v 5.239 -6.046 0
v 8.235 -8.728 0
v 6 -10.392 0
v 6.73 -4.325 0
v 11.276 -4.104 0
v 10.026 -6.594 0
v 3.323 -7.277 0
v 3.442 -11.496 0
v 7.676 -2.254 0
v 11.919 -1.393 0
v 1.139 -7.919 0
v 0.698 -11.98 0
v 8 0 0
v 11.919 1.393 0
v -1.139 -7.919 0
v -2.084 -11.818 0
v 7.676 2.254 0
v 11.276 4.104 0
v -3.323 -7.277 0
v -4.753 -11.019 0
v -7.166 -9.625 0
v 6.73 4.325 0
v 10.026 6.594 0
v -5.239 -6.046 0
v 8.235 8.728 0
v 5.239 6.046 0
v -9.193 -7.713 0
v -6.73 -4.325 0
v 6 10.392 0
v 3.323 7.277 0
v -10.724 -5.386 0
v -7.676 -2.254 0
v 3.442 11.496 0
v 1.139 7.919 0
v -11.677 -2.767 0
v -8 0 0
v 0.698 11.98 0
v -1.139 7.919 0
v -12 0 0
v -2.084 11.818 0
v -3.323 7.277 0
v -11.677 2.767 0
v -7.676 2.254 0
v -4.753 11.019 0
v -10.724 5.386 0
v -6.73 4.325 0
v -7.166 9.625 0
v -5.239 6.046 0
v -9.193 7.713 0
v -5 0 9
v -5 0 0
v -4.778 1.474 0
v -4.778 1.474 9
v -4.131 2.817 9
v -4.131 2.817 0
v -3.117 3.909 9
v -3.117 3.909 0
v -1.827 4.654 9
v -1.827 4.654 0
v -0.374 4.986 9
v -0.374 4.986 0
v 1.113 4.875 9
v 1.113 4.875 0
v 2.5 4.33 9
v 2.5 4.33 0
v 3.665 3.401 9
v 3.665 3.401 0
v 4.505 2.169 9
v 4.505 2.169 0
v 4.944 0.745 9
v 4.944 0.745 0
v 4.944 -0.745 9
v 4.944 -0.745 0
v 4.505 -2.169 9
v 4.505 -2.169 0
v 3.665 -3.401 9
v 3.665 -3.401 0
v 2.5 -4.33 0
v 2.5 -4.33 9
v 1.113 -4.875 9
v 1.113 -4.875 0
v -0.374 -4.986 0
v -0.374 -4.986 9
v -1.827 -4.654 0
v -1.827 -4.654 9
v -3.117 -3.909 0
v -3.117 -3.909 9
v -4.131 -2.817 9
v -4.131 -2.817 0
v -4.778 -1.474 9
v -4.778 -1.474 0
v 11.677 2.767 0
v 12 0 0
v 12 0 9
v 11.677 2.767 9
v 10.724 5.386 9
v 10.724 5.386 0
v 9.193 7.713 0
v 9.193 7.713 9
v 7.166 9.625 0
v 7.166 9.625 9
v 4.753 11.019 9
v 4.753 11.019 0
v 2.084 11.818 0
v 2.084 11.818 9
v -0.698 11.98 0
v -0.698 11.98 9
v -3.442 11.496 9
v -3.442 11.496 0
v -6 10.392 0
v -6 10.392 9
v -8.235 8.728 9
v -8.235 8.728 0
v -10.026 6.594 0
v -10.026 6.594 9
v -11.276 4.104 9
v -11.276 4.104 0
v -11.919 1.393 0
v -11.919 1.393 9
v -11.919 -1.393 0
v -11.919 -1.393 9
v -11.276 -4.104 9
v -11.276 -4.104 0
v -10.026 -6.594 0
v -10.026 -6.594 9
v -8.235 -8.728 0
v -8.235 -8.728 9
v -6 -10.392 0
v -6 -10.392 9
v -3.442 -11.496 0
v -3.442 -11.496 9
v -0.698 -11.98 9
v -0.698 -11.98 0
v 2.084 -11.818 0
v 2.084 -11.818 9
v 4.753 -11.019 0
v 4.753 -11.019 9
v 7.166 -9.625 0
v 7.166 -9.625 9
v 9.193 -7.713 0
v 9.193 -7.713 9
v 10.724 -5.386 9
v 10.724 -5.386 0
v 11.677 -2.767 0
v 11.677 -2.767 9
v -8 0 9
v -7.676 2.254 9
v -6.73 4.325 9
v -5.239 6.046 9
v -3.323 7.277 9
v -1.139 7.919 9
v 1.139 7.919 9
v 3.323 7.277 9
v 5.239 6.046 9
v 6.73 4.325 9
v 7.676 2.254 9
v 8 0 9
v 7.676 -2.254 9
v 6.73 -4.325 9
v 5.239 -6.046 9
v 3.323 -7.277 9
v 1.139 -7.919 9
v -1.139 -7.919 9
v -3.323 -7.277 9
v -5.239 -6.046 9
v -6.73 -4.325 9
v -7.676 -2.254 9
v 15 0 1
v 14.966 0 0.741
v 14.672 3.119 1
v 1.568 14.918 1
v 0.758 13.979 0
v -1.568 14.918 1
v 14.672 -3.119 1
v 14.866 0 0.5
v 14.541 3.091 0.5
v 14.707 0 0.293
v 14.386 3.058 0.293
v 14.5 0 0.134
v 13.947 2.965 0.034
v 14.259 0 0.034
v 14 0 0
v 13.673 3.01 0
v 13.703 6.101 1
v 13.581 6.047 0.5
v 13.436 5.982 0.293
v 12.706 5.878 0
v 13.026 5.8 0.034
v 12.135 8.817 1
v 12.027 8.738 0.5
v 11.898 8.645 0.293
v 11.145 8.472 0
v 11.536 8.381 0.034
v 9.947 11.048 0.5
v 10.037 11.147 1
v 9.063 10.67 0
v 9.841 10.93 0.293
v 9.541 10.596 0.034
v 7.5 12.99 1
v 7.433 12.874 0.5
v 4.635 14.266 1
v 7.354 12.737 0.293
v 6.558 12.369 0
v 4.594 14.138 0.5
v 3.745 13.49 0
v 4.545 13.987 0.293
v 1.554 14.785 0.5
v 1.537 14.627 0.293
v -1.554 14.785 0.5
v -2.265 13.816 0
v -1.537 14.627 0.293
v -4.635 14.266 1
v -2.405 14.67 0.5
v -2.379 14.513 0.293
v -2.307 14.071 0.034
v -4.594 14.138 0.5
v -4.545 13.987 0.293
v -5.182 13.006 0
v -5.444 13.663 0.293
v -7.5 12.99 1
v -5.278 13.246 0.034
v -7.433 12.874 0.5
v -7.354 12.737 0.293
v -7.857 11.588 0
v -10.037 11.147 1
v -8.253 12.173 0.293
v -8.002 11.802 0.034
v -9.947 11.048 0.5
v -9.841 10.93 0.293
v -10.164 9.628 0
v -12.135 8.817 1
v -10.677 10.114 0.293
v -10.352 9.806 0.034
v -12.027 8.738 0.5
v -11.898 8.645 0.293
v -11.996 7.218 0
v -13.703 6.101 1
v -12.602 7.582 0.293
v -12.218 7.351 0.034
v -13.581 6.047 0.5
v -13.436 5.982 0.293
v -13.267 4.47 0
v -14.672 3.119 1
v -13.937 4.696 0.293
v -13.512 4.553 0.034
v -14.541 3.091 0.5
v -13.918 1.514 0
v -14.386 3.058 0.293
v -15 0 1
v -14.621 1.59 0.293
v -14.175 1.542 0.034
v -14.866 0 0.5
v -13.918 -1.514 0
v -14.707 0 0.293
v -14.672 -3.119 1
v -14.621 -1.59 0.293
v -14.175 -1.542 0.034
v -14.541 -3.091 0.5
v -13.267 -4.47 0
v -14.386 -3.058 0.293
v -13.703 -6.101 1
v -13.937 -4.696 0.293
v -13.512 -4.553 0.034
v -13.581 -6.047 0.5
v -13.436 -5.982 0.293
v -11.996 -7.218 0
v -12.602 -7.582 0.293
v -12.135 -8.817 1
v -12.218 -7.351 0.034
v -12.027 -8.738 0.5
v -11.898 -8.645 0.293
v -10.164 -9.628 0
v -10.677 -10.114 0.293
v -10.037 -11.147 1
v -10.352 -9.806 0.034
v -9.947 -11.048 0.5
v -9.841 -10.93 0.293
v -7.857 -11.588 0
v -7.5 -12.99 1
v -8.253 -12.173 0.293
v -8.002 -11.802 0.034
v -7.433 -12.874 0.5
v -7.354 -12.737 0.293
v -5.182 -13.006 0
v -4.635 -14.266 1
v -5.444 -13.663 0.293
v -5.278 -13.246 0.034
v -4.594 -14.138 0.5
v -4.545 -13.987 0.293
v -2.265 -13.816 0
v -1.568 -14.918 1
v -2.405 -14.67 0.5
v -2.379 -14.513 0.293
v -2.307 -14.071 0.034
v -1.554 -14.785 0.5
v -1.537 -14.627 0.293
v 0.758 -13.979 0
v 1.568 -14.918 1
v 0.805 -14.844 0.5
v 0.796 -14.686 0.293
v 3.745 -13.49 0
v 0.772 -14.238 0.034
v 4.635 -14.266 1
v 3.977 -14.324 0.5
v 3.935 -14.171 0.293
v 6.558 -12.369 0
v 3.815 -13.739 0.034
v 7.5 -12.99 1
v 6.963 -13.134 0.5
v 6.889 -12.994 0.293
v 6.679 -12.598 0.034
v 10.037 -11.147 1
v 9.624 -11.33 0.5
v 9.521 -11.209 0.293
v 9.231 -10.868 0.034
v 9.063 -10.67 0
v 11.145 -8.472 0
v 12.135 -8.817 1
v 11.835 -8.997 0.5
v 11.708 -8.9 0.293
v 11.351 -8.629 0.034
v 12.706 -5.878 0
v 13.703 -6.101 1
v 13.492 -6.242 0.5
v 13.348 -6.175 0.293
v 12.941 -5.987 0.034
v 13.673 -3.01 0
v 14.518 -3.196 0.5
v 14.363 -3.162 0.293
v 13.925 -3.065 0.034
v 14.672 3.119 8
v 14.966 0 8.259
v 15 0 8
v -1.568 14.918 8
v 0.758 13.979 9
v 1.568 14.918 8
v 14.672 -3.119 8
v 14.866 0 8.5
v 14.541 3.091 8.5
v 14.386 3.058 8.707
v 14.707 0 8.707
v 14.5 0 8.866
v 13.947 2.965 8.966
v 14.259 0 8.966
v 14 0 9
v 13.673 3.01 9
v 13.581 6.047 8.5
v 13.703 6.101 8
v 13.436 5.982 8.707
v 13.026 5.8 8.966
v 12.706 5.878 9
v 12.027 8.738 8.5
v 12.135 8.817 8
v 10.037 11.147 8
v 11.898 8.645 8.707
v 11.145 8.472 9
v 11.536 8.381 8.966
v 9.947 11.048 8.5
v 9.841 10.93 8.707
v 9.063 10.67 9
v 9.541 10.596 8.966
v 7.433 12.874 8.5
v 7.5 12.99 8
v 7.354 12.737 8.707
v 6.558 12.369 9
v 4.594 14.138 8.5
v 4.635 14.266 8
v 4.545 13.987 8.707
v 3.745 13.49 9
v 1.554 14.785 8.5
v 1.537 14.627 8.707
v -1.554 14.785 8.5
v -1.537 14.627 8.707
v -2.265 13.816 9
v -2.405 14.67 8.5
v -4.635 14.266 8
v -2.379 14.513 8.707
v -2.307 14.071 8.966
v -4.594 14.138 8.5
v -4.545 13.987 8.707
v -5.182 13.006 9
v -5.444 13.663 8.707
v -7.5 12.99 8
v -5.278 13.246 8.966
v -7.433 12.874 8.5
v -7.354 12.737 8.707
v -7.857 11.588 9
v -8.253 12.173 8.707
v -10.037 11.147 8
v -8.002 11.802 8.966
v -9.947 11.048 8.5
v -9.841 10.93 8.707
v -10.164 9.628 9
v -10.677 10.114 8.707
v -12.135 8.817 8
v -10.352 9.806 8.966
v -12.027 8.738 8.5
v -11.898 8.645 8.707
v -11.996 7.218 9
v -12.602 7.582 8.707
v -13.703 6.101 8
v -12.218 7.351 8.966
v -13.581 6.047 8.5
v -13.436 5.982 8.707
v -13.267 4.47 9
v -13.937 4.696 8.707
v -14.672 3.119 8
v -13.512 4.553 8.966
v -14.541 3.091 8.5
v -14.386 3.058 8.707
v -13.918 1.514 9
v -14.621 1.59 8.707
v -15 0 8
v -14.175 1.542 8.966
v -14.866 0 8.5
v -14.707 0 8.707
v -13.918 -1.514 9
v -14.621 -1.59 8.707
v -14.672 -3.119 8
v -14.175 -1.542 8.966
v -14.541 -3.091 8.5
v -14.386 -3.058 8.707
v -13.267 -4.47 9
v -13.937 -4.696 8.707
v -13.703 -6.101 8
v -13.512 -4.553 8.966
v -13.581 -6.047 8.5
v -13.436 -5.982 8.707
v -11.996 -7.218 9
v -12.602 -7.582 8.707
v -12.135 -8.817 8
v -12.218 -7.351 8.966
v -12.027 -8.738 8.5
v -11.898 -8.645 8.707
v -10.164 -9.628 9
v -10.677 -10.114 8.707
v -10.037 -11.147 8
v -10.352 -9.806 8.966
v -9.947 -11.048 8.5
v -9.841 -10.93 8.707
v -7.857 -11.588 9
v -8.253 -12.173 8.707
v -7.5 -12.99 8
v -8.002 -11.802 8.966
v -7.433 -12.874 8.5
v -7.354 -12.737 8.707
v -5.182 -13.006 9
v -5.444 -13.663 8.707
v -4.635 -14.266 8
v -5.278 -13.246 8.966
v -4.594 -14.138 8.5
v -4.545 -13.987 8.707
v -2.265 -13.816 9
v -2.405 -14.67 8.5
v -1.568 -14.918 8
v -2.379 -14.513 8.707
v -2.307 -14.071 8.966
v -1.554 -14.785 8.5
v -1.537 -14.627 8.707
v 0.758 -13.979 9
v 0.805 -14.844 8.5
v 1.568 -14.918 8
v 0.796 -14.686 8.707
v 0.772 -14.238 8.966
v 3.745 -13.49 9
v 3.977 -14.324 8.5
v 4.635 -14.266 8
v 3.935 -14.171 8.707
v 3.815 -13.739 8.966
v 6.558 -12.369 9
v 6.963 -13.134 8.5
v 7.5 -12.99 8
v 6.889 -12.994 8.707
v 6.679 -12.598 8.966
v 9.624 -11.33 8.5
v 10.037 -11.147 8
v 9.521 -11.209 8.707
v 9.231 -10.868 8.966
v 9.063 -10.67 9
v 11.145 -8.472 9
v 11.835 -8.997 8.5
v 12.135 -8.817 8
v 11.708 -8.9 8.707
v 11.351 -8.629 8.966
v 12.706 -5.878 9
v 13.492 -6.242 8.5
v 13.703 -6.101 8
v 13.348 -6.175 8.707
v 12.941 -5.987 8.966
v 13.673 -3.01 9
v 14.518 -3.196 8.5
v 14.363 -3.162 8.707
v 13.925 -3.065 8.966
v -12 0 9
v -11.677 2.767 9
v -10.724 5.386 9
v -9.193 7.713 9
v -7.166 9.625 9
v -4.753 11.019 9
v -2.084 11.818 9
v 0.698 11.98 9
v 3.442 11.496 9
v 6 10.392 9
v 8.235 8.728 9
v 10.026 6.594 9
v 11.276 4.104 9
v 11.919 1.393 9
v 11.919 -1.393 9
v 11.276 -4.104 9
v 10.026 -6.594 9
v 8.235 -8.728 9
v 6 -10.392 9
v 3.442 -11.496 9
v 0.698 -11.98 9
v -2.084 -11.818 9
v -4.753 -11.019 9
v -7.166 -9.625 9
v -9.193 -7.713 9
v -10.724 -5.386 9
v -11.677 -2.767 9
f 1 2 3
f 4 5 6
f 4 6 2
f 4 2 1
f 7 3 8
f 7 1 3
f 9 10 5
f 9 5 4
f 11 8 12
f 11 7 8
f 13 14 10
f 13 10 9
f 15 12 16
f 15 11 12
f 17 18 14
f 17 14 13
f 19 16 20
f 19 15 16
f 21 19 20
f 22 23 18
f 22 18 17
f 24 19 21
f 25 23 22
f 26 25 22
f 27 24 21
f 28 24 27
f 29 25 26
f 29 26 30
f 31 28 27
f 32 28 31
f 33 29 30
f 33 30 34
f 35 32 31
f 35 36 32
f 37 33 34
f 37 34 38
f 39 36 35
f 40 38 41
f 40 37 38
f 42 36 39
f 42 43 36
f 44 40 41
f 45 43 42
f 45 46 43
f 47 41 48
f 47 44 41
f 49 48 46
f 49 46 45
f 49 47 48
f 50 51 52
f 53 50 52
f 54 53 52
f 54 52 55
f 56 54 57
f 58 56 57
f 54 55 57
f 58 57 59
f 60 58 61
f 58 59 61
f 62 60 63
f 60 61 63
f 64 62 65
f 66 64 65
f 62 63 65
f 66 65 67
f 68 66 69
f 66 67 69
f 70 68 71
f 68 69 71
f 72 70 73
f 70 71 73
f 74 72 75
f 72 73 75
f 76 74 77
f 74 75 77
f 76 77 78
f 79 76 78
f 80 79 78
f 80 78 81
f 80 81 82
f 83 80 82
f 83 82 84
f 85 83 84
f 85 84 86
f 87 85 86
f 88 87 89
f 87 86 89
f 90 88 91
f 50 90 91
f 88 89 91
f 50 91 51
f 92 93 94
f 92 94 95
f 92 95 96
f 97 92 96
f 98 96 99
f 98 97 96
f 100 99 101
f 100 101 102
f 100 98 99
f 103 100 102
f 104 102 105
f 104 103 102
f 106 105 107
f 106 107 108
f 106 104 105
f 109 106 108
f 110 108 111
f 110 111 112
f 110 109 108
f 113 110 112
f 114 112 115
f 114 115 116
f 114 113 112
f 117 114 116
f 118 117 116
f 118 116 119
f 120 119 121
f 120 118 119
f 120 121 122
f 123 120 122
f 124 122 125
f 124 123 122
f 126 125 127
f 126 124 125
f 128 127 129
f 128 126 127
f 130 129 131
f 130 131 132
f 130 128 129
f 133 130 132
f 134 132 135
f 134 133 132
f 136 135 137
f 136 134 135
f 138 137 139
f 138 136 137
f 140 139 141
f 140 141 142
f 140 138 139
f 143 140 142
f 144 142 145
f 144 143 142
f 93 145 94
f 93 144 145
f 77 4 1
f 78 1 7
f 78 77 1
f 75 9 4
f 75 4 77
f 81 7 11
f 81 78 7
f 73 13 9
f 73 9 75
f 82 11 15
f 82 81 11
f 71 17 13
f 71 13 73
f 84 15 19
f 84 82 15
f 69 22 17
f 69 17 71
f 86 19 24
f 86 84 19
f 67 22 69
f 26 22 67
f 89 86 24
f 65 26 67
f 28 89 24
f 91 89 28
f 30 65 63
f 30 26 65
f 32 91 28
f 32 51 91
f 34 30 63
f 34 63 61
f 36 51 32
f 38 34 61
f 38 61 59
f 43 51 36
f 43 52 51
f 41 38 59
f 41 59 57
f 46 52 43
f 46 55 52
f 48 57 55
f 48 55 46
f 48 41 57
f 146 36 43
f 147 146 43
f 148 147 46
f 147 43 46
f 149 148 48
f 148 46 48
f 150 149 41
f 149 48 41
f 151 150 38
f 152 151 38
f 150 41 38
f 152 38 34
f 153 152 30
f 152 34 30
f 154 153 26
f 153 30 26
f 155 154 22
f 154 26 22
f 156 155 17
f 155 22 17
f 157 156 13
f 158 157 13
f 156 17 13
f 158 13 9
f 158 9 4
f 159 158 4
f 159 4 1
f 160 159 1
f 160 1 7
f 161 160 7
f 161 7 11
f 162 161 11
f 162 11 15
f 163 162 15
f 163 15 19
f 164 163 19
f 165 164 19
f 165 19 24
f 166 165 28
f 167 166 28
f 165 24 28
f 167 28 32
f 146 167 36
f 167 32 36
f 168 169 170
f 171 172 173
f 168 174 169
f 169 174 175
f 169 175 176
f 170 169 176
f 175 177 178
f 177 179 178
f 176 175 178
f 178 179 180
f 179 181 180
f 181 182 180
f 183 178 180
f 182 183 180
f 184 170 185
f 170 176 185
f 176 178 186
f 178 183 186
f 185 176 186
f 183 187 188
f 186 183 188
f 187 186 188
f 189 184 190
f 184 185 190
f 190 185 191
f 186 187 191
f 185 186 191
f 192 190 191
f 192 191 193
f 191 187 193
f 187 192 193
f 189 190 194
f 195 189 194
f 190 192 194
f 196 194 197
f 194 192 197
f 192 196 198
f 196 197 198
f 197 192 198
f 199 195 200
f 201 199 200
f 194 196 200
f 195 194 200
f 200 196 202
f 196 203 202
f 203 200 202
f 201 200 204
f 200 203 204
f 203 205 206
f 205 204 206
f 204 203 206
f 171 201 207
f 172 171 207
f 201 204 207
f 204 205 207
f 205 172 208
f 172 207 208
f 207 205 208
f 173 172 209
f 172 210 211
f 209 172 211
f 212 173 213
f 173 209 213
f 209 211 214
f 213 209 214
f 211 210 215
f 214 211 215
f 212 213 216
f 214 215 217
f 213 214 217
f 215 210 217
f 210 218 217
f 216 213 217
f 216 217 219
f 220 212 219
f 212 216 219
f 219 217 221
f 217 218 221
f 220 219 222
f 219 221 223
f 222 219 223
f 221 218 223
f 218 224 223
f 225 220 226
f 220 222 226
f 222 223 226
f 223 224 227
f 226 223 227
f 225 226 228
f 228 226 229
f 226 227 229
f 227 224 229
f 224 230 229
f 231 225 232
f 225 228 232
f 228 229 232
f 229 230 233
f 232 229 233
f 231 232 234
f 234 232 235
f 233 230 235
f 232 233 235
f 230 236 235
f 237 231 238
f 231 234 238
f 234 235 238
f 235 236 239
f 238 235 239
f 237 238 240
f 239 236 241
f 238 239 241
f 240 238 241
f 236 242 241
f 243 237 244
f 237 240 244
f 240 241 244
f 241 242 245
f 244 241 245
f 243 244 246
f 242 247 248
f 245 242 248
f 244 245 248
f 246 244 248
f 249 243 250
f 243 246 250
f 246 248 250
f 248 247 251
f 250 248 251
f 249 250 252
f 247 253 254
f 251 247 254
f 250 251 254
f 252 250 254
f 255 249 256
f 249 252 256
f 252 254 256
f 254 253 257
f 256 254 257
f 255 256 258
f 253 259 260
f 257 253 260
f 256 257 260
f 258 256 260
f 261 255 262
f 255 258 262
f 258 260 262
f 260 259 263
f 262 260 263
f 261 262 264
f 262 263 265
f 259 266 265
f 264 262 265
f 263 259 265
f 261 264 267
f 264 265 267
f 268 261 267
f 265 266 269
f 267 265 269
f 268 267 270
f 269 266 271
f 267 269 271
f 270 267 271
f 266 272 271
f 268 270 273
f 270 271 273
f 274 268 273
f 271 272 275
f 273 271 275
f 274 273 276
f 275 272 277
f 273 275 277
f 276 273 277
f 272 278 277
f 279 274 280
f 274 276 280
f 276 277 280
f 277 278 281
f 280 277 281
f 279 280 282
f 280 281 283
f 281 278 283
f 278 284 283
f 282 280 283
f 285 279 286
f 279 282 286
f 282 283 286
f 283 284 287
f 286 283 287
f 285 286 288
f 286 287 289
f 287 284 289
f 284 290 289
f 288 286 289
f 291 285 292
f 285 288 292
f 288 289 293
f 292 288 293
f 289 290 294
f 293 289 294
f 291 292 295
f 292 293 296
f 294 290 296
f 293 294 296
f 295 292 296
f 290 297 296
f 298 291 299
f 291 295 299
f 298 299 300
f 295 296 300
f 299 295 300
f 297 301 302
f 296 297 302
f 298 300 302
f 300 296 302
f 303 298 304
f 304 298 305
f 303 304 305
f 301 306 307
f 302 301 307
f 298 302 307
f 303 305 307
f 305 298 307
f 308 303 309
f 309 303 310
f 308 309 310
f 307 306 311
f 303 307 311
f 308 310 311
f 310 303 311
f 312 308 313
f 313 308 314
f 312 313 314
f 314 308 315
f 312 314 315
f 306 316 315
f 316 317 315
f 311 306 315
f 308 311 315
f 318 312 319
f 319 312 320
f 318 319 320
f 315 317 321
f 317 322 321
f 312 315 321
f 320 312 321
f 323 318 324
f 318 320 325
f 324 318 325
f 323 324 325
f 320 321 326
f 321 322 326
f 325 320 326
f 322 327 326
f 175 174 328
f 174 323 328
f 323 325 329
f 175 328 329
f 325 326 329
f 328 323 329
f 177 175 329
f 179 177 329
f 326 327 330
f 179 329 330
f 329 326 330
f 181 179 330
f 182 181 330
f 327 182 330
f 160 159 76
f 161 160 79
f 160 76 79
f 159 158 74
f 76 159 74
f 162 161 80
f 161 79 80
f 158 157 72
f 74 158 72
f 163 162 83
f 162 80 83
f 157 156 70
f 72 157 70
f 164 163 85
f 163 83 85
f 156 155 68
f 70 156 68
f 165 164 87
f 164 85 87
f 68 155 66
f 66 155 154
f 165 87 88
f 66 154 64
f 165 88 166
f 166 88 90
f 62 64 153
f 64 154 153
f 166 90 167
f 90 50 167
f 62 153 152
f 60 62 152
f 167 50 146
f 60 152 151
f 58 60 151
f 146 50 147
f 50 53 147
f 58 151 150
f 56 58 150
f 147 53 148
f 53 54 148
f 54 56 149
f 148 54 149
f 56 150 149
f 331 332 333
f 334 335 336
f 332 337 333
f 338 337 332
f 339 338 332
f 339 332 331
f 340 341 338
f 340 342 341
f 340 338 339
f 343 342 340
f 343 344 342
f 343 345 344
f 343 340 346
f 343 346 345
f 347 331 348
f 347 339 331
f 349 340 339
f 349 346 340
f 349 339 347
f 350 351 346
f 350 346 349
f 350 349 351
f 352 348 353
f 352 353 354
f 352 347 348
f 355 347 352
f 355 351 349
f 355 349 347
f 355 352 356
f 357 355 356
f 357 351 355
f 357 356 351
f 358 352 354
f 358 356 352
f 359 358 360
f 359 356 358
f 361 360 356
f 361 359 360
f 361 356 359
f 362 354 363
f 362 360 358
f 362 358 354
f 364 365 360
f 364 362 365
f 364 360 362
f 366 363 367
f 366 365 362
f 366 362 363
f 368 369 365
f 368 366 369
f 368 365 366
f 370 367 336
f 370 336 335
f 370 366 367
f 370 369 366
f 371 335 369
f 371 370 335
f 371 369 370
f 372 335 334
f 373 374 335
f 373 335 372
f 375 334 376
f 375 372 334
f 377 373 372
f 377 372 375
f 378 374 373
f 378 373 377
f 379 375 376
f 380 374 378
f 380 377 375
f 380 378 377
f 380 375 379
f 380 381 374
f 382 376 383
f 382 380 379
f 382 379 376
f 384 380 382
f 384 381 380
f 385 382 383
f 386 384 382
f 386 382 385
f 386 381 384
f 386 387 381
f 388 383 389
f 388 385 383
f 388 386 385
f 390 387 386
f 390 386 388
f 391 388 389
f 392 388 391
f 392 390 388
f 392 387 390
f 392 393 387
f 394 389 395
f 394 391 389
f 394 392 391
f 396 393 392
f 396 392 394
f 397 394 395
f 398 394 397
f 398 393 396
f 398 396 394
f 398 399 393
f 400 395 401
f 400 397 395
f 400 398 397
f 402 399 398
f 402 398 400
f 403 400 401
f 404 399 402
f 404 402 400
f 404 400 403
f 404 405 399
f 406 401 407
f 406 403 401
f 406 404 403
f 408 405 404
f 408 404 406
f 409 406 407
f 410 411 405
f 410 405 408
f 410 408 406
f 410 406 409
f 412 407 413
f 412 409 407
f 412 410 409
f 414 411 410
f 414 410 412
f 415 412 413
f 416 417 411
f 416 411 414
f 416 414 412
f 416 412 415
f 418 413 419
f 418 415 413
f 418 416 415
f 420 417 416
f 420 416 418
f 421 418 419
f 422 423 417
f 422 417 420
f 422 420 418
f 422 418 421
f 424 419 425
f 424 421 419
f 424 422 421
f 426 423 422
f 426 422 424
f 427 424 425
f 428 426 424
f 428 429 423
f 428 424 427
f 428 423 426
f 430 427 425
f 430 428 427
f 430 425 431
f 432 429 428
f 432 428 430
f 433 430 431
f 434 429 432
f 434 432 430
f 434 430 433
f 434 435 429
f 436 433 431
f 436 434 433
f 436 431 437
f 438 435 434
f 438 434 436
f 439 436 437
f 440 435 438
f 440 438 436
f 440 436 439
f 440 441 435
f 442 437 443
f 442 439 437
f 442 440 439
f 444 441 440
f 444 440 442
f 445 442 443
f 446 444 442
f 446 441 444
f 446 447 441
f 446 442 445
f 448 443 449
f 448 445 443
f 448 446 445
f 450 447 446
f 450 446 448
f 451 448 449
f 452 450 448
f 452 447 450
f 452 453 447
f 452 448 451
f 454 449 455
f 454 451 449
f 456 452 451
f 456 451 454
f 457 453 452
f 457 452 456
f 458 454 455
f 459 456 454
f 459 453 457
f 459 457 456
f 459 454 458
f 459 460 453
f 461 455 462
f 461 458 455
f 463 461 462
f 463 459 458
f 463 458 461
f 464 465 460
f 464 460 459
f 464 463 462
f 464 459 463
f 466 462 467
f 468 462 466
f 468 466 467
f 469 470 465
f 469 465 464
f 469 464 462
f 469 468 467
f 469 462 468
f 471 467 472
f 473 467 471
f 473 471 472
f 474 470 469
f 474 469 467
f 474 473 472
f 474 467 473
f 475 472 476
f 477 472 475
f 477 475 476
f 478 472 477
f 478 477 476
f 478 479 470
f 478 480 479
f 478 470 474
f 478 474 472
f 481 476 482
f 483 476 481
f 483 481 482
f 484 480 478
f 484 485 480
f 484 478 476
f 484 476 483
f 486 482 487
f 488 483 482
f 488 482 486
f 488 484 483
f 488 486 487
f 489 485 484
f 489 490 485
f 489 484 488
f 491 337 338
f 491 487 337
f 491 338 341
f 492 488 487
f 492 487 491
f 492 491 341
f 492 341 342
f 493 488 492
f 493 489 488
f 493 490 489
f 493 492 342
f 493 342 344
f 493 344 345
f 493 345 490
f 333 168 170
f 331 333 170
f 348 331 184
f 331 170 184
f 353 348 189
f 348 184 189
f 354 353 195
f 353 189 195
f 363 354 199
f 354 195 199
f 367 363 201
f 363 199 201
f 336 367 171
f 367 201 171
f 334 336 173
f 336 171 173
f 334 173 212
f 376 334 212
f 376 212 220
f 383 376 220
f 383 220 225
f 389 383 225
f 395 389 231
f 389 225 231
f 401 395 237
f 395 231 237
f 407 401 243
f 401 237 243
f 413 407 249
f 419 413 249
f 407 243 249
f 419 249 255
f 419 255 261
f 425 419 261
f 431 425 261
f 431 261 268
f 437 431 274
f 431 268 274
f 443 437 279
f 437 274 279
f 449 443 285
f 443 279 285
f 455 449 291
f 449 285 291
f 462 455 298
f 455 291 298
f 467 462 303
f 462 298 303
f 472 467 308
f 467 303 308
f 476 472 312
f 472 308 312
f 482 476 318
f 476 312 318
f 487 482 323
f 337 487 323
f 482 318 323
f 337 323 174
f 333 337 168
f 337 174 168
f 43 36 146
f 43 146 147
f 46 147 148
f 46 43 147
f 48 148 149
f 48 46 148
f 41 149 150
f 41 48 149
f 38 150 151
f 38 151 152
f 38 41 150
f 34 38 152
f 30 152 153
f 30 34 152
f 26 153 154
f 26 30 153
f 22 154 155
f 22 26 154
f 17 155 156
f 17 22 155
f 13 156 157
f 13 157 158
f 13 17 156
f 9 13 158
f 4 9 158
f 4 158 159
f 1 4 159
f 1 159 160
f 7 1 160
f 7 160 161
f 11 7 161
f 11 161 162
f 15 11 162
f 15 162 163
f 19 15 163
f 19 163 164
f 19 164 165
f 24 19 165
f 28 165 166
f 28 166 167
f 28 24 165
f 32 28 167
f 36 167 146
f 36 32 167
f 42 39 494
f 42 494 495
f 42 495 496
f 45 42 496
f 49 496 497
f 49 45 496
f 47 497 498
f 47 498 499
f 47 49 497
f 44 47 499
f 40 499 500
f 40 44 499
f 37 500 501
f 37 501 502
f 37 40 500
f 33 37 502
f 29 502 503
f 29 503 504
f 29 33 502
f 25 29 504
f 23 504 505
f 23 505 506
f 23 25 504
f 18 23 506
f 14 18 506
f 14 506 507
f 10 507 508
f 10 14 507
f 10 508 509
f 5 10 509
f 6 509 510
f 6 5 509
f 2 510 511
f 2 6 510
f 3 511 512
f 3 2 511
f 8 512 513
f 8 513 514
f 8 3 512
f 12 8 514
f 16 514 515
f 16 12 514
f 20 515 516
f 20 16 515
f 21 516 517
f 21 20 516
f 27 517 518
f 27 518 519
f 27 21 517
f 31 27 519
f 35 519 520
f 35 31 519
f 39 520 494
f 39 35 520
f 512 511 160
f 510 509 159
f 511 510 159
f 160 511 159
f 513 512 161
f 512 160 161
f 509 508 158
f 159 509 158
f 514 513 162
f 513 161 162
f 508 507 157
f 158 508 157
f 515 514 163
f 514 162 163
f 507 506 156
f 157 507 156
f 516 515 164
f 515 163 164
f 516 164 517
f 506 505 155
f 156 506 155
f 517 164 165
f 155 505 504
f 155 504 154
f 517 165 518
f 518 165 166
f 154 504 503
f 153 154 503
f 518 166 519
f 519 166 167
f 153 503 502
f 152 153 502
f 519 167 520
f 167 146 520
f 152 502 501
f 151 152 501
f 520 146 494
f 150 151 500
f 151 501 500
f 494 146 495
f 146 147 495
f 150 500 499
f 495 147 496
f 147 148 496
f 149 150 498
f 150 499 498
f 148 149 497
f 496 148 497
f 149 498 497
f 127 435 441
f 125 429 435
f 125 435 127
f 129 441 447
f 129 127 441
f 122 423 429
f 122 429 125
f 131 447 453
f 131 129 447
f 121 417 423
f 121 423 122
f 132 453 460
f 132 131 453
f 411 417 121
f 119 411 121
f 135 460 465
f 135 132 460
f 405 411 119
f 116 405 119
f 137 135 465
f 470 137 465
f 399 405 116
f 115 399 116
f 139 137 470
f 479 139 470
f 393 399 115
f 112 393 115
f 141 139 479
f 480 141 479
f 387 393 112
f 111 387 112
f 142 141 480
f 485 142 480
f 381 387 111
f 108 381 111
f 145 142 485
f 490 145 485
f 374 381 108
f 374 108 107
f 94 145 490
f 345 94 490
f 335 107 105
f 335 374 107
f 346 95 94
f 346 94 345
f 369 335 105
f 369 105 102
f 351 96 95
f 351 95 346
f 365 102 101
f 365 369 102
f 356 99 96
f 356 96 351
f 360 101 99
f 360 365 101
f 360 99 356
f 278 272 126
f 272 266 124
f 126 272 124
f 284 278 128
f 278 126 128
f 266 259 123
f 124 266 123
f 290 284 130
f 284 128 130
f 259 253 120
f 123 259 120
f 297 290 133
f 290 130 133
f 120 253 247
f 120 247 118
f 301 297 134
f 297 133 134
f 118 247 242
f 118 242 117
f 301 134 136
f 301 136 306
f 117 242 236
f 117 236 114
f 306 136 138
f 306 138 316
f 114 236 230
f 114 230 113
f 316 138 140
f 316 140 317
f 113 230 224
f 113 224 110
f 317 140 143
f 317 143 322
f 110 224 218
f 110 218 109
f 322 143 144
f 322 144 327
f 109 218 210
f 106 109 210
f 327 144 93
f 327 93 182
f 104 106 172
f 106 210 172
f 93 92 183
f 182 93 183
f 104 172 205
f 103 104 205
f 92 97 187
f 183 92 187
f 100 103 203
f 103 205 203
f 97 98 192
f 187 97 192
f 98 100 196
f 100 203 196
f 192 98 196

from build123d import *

# Parameters (mm, degrees)
SKETCH1_R           = 15
SKETCH1_R_2         = 12
BOSS_EXTRUDE1_DEPTH = 9
SKETCH2_R           = 8
SKETCH2_R_2         = 5
BOSS_EXTRUDE2_DEPTH = 9
SKETCH3_R           = 12
SKETCH3_R_2         = 8
BOSS_EXTRUDE3_DEPTH = 9
FILLET1_R           = 1


with BuildPart() as part:
    # Sketch1 → Boss-Extrude1 (new body)
    with BuildSketch(Plane.XY):
        Circle(SKETCH1_R)
        Circle(SKETCH1_R_2, mode=Mode.SUBTRACT)
    extrude(amount=BOSS_EXTRUDE1_DEPTH)

    # Fillet1
    fillet1_edges = [part.edges().sort_by_distance(p)[0] for p in [
        (-15, 0, 0),
        (-15, 0, 9),
    ]]
    fillet(fillet1_edges, radius=FILLET1_R)


with BuildPart() as body_2:
    # Sketch2 → Boss-Extrude2 (new body)
    with BuildSketch(Plane(origin=(0, 0, 0), x_dir=(-1, 0, 0), z_dir=(0, 0, -1))):
        Circle(SKETCH2_R)
        Circle(SKETCH2_R_2, mode=Mode.SUBTRACT)
    extrude(amount=-BOSS_EXTRUDE2_DEPTH)


with BuildPart() as body_3:
    # Sketch3 → Boss-Extrude3 (new body)
    with BuildSketch(Plane(origin=(0, 0, 0), x_dir=(-1, 0, 0), z_dir=(0, 0, -1))):
        Circle(SKETCH3_R)
        Circle(SKETCH3_R_2, mode=Mode.SUBTRACT)
    extrude(amount=-BOSS_EXTRUDE3_DEPTH)


solid = Compound([part.part, body_2.part, body_3.part])
